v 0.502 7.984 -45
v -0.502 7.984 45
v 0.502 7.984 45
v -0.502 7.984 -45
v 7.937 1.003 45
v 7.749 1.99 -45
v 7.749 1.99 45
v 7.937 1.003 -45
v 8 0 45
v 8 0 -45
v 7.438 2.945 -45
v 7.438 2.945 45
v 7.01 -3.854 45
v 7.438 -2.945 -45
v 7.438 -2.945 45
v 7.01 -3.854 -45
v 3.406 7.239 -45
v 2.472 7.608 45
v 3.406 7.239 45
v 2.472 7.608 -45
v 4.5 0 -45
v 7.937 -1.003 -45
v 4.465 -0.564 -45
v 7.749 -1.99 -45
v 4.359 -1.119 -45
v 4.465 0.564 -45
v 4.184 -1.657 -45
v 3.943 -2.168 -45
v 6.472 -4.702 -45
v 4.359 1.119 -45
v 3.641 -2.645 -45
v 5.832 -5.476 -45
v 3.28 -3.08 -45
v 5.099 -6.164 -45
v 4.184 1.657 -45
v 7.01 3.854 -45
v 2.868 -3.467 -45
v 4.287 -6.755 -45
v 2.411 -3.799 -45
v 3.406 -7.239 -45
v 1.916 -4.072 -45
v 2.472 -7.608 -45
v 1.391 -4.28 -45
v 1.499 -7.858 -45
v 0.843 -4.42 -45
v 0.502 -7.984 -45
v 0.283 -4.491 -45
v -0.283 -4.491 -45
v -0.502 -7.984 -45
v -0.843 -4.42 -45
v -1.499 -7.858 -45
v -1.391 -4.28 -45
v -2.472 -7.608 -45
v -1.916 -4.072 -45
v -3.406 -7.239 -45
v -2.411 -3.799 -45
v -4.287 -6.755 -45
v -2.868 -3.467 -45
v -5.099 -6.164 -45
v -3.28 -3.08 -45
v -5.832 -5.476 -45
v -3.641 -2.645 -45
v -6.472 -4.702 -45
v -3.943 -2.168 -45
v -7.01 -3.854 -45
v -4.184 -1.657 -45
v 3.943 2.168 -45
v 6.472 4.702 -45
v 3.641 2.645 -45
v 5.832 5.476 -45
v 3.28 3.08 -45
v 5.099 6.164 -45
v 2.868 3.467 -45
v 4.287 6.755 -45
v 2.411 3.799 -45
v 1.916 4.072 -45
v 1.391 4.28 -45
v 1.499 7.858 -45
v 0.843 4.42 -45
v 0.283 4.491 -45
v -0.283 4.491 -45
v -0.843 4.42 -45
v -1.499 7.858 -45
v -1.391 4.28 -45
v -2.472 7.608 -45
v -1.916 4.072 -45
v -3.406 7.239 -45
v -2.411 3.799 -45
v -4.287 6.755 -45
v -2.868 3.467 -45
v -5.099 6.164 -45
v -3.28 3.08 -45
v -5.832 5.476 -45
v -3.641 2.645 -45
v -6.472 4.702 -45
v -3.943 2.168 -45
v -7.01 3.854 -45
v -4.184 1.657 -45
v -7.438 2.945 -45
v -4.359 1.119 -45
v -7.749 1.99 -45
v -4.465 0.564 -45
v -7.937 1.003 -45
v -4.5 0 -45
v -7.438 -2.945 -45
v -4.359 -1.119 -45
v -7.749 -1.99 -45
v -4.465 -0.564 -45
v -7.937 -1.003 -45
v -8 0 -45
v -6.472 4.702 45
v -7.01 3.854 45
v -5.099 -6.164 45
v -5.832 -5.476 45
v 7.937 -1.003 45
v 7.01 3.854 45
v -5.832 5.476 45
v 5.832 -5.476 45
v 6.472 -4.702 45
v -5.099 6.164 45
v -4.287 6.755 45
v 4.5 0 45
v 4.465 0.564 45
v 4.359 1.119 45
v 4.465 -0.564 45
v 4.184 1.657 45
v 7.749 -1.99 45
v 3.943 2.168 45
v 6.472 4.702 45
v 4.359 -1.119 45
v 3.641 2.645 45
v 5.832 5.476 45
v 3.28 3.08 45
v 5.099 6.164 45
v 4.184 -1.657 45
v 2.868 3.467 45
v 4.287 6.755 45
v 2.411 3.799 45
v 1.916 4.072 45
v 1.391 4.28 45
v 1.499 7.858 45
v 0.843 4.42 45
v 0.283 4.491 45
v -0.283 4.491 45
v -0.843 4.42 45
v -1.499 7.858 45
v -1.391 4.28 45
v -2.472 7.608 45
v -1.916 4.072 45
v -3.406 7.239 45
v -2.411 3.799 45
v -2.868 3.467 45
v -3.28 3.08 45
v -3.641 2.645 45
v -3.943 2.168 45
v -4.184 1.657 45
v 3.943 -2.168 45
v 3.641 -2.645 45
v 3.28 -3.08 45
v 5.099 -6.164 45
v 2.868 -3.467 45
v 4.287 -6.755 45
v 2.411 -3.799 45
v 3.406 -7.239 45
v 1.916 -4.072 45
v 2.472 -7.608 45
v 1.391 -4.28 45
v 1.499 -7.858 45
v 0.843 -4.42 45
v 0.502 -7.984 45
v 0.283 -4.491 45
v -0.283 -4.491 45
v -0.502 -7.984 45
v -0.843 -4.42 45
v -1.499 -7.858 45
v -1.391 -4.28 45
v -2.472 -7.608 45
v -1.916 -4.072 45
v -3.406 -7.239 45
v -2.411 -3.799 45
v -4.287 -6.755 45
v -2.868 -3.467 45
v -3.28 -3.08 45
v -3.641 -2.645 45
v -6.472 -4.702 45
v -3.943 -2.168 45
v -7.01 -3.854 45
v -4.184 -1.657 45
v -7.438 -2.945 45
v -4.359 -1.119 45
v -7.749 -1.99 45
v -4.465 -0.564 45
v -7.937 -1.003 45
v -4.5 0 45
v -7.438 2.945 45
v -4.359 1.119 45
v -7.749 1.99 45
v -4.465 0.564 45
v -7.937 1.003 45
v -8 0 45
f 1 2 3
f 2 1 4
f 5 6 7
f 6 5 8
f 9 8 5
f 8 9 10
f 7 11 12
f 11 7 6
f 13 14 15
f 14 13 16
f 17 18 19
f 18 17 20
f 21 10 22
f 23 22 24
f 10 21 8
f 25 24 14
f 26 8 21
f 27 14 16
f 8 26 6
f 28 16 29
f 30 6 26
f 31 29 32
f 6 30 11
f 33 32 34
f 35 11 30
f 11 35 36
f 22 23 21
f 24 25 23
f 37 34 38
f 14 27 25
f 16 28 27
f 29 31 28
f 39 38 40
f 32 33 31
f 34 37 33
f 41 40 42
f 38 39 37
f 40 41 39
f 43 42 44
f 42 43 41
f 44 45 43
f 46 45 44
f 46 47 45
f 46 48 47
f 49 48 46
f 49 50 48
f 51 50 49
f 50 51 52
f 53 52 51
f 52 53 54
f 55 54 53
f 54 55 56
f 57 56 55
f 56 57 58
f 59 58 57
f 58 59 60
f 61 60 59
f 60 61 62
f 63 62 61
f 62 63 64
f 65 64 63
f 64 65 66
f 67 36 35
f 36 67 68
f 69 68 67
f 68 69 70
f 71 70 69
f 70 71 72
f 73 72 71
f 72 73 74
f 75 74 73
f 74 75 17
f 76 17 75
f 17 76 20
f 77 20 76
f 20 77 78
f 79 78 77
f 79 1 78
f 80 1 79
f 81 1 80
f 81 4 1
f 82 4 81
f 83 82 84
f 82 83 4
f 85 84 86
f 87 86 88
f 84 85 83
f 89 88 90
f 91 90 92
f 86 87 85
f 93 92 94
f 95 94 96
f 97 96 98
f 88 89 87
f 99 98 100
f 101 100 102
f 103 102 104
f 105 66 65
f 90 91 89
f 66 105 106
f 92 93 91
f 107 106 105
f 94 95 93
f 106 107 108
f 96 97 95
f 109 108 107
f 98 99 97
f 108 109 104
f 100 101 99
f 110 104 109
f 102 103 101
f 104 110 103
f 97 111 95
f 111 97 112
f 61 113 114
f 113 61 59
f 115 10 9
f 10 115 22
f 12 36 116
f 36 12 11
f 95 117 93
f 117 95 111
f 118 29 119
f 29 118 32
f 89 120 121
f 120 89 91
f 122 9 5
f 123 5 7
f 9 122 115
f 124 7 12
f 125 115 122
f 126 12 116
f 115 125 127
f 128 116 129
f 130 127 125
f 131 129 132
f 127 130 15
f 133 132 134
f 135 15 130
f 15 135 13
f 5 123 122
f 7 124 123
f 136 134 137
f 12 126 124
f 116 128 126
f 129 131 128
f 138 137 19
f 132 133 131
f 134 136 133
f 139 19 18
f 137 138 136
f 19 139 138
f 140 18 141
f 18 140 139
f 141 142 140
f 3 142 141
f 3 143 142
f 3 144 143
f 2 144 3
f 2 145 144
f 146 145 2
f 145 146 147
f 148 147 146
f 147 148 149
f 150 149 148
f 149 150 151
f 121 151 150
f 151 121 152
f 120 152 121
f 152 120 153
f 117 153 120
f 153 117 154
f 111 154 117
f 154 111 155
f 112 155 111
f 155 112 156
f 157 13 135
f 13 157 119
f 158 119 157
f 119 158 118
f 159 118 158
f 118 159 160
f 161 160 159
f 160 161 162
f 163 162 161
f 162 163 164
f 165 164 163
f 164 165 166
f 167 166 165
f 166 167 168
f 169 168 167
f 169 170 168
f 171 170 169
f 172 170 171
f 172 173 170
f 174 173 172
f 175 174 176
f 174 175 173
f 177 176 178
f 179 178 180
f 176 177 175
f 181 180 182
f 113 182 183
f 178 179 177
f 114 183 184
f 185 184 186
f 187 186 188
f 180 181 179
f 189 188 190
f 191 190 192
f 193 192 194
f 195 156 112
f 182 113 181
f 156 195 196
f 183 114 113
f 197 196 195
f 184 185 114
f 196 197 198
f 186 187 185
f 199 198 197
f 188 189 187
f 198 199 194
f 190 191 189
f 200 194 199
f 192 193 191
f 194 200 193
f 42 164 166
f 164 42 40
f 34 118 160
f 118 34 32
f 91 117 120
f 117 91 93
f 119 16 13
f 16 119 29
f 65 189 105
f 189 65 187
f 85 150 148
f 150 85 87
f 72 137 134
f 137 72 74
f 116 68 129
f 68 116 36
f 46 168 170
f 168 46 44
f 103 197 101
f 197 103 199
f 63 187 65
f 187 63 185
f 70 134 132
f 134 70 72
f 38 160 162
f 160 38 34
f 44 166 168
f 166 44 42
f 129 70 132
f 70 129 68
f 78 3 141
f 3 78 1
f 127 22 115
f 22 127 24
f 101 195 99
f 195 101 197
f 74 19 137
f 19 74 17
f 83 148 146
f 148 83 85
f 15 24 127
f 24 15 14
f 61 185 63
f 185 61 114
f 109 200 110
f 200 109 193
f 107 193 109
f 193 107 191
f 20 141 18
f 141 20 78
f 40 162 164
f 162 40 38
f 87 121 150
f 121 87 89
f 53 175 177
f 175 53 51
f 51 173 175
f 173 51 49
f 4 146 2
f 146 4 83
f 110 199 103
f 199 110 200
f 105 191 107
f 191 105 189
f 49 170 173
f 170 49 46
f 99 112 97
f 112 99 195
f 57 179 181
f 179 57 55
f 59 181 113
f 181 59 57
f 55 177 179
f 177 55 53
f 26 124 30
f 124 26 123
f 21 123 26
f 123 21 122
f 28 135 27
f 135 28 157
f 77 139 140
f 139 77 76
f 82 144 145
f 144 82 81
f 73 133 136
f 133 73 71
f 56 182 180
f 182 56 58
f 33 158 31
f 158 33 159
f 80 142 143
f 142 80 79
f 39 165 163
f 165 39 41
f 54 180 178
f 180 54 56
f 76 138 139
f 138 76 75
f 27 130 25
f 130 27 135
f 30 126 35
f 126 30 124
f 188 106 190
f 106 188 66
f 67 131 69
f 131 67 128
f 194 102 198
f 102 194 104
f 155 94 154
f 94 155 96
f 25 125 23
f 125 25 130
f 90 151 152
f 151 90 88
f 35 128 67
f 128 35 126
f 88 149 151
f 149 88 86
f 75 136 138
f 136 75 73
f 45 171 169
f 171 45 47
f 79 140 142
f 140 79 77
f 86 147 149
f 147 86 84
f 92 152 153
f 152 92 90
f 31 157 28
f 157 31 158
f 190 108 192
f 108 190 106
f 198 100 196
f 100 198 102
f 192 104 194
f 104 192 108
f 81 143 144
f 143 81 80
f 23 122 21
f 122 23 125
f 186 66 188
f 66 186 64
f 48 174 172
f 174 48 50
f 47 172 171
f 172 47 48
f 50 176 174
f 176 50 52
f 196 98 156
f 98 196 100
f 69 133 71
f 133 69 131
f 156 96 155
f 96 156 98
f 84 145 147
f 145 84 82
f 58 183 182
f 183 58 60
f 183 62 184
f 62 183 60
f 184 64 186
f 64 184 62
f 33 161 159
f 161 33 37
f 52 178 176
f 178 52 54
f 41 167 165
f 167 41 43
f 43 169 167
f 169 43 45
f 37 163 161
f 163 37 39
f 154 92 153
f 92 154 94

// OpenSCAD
$fn = 50;


difference() {
	union() {
		translate(v = [0, 0, -45.0000000000]) {
			cylinder(h = 90, r = 8.0000000000);
		}
	}
	union() {
		translate(v = [0, 0, -100.0000000000]) {
			cylinder(h = 200, r = 4.5000000000);
		}
	}
}
